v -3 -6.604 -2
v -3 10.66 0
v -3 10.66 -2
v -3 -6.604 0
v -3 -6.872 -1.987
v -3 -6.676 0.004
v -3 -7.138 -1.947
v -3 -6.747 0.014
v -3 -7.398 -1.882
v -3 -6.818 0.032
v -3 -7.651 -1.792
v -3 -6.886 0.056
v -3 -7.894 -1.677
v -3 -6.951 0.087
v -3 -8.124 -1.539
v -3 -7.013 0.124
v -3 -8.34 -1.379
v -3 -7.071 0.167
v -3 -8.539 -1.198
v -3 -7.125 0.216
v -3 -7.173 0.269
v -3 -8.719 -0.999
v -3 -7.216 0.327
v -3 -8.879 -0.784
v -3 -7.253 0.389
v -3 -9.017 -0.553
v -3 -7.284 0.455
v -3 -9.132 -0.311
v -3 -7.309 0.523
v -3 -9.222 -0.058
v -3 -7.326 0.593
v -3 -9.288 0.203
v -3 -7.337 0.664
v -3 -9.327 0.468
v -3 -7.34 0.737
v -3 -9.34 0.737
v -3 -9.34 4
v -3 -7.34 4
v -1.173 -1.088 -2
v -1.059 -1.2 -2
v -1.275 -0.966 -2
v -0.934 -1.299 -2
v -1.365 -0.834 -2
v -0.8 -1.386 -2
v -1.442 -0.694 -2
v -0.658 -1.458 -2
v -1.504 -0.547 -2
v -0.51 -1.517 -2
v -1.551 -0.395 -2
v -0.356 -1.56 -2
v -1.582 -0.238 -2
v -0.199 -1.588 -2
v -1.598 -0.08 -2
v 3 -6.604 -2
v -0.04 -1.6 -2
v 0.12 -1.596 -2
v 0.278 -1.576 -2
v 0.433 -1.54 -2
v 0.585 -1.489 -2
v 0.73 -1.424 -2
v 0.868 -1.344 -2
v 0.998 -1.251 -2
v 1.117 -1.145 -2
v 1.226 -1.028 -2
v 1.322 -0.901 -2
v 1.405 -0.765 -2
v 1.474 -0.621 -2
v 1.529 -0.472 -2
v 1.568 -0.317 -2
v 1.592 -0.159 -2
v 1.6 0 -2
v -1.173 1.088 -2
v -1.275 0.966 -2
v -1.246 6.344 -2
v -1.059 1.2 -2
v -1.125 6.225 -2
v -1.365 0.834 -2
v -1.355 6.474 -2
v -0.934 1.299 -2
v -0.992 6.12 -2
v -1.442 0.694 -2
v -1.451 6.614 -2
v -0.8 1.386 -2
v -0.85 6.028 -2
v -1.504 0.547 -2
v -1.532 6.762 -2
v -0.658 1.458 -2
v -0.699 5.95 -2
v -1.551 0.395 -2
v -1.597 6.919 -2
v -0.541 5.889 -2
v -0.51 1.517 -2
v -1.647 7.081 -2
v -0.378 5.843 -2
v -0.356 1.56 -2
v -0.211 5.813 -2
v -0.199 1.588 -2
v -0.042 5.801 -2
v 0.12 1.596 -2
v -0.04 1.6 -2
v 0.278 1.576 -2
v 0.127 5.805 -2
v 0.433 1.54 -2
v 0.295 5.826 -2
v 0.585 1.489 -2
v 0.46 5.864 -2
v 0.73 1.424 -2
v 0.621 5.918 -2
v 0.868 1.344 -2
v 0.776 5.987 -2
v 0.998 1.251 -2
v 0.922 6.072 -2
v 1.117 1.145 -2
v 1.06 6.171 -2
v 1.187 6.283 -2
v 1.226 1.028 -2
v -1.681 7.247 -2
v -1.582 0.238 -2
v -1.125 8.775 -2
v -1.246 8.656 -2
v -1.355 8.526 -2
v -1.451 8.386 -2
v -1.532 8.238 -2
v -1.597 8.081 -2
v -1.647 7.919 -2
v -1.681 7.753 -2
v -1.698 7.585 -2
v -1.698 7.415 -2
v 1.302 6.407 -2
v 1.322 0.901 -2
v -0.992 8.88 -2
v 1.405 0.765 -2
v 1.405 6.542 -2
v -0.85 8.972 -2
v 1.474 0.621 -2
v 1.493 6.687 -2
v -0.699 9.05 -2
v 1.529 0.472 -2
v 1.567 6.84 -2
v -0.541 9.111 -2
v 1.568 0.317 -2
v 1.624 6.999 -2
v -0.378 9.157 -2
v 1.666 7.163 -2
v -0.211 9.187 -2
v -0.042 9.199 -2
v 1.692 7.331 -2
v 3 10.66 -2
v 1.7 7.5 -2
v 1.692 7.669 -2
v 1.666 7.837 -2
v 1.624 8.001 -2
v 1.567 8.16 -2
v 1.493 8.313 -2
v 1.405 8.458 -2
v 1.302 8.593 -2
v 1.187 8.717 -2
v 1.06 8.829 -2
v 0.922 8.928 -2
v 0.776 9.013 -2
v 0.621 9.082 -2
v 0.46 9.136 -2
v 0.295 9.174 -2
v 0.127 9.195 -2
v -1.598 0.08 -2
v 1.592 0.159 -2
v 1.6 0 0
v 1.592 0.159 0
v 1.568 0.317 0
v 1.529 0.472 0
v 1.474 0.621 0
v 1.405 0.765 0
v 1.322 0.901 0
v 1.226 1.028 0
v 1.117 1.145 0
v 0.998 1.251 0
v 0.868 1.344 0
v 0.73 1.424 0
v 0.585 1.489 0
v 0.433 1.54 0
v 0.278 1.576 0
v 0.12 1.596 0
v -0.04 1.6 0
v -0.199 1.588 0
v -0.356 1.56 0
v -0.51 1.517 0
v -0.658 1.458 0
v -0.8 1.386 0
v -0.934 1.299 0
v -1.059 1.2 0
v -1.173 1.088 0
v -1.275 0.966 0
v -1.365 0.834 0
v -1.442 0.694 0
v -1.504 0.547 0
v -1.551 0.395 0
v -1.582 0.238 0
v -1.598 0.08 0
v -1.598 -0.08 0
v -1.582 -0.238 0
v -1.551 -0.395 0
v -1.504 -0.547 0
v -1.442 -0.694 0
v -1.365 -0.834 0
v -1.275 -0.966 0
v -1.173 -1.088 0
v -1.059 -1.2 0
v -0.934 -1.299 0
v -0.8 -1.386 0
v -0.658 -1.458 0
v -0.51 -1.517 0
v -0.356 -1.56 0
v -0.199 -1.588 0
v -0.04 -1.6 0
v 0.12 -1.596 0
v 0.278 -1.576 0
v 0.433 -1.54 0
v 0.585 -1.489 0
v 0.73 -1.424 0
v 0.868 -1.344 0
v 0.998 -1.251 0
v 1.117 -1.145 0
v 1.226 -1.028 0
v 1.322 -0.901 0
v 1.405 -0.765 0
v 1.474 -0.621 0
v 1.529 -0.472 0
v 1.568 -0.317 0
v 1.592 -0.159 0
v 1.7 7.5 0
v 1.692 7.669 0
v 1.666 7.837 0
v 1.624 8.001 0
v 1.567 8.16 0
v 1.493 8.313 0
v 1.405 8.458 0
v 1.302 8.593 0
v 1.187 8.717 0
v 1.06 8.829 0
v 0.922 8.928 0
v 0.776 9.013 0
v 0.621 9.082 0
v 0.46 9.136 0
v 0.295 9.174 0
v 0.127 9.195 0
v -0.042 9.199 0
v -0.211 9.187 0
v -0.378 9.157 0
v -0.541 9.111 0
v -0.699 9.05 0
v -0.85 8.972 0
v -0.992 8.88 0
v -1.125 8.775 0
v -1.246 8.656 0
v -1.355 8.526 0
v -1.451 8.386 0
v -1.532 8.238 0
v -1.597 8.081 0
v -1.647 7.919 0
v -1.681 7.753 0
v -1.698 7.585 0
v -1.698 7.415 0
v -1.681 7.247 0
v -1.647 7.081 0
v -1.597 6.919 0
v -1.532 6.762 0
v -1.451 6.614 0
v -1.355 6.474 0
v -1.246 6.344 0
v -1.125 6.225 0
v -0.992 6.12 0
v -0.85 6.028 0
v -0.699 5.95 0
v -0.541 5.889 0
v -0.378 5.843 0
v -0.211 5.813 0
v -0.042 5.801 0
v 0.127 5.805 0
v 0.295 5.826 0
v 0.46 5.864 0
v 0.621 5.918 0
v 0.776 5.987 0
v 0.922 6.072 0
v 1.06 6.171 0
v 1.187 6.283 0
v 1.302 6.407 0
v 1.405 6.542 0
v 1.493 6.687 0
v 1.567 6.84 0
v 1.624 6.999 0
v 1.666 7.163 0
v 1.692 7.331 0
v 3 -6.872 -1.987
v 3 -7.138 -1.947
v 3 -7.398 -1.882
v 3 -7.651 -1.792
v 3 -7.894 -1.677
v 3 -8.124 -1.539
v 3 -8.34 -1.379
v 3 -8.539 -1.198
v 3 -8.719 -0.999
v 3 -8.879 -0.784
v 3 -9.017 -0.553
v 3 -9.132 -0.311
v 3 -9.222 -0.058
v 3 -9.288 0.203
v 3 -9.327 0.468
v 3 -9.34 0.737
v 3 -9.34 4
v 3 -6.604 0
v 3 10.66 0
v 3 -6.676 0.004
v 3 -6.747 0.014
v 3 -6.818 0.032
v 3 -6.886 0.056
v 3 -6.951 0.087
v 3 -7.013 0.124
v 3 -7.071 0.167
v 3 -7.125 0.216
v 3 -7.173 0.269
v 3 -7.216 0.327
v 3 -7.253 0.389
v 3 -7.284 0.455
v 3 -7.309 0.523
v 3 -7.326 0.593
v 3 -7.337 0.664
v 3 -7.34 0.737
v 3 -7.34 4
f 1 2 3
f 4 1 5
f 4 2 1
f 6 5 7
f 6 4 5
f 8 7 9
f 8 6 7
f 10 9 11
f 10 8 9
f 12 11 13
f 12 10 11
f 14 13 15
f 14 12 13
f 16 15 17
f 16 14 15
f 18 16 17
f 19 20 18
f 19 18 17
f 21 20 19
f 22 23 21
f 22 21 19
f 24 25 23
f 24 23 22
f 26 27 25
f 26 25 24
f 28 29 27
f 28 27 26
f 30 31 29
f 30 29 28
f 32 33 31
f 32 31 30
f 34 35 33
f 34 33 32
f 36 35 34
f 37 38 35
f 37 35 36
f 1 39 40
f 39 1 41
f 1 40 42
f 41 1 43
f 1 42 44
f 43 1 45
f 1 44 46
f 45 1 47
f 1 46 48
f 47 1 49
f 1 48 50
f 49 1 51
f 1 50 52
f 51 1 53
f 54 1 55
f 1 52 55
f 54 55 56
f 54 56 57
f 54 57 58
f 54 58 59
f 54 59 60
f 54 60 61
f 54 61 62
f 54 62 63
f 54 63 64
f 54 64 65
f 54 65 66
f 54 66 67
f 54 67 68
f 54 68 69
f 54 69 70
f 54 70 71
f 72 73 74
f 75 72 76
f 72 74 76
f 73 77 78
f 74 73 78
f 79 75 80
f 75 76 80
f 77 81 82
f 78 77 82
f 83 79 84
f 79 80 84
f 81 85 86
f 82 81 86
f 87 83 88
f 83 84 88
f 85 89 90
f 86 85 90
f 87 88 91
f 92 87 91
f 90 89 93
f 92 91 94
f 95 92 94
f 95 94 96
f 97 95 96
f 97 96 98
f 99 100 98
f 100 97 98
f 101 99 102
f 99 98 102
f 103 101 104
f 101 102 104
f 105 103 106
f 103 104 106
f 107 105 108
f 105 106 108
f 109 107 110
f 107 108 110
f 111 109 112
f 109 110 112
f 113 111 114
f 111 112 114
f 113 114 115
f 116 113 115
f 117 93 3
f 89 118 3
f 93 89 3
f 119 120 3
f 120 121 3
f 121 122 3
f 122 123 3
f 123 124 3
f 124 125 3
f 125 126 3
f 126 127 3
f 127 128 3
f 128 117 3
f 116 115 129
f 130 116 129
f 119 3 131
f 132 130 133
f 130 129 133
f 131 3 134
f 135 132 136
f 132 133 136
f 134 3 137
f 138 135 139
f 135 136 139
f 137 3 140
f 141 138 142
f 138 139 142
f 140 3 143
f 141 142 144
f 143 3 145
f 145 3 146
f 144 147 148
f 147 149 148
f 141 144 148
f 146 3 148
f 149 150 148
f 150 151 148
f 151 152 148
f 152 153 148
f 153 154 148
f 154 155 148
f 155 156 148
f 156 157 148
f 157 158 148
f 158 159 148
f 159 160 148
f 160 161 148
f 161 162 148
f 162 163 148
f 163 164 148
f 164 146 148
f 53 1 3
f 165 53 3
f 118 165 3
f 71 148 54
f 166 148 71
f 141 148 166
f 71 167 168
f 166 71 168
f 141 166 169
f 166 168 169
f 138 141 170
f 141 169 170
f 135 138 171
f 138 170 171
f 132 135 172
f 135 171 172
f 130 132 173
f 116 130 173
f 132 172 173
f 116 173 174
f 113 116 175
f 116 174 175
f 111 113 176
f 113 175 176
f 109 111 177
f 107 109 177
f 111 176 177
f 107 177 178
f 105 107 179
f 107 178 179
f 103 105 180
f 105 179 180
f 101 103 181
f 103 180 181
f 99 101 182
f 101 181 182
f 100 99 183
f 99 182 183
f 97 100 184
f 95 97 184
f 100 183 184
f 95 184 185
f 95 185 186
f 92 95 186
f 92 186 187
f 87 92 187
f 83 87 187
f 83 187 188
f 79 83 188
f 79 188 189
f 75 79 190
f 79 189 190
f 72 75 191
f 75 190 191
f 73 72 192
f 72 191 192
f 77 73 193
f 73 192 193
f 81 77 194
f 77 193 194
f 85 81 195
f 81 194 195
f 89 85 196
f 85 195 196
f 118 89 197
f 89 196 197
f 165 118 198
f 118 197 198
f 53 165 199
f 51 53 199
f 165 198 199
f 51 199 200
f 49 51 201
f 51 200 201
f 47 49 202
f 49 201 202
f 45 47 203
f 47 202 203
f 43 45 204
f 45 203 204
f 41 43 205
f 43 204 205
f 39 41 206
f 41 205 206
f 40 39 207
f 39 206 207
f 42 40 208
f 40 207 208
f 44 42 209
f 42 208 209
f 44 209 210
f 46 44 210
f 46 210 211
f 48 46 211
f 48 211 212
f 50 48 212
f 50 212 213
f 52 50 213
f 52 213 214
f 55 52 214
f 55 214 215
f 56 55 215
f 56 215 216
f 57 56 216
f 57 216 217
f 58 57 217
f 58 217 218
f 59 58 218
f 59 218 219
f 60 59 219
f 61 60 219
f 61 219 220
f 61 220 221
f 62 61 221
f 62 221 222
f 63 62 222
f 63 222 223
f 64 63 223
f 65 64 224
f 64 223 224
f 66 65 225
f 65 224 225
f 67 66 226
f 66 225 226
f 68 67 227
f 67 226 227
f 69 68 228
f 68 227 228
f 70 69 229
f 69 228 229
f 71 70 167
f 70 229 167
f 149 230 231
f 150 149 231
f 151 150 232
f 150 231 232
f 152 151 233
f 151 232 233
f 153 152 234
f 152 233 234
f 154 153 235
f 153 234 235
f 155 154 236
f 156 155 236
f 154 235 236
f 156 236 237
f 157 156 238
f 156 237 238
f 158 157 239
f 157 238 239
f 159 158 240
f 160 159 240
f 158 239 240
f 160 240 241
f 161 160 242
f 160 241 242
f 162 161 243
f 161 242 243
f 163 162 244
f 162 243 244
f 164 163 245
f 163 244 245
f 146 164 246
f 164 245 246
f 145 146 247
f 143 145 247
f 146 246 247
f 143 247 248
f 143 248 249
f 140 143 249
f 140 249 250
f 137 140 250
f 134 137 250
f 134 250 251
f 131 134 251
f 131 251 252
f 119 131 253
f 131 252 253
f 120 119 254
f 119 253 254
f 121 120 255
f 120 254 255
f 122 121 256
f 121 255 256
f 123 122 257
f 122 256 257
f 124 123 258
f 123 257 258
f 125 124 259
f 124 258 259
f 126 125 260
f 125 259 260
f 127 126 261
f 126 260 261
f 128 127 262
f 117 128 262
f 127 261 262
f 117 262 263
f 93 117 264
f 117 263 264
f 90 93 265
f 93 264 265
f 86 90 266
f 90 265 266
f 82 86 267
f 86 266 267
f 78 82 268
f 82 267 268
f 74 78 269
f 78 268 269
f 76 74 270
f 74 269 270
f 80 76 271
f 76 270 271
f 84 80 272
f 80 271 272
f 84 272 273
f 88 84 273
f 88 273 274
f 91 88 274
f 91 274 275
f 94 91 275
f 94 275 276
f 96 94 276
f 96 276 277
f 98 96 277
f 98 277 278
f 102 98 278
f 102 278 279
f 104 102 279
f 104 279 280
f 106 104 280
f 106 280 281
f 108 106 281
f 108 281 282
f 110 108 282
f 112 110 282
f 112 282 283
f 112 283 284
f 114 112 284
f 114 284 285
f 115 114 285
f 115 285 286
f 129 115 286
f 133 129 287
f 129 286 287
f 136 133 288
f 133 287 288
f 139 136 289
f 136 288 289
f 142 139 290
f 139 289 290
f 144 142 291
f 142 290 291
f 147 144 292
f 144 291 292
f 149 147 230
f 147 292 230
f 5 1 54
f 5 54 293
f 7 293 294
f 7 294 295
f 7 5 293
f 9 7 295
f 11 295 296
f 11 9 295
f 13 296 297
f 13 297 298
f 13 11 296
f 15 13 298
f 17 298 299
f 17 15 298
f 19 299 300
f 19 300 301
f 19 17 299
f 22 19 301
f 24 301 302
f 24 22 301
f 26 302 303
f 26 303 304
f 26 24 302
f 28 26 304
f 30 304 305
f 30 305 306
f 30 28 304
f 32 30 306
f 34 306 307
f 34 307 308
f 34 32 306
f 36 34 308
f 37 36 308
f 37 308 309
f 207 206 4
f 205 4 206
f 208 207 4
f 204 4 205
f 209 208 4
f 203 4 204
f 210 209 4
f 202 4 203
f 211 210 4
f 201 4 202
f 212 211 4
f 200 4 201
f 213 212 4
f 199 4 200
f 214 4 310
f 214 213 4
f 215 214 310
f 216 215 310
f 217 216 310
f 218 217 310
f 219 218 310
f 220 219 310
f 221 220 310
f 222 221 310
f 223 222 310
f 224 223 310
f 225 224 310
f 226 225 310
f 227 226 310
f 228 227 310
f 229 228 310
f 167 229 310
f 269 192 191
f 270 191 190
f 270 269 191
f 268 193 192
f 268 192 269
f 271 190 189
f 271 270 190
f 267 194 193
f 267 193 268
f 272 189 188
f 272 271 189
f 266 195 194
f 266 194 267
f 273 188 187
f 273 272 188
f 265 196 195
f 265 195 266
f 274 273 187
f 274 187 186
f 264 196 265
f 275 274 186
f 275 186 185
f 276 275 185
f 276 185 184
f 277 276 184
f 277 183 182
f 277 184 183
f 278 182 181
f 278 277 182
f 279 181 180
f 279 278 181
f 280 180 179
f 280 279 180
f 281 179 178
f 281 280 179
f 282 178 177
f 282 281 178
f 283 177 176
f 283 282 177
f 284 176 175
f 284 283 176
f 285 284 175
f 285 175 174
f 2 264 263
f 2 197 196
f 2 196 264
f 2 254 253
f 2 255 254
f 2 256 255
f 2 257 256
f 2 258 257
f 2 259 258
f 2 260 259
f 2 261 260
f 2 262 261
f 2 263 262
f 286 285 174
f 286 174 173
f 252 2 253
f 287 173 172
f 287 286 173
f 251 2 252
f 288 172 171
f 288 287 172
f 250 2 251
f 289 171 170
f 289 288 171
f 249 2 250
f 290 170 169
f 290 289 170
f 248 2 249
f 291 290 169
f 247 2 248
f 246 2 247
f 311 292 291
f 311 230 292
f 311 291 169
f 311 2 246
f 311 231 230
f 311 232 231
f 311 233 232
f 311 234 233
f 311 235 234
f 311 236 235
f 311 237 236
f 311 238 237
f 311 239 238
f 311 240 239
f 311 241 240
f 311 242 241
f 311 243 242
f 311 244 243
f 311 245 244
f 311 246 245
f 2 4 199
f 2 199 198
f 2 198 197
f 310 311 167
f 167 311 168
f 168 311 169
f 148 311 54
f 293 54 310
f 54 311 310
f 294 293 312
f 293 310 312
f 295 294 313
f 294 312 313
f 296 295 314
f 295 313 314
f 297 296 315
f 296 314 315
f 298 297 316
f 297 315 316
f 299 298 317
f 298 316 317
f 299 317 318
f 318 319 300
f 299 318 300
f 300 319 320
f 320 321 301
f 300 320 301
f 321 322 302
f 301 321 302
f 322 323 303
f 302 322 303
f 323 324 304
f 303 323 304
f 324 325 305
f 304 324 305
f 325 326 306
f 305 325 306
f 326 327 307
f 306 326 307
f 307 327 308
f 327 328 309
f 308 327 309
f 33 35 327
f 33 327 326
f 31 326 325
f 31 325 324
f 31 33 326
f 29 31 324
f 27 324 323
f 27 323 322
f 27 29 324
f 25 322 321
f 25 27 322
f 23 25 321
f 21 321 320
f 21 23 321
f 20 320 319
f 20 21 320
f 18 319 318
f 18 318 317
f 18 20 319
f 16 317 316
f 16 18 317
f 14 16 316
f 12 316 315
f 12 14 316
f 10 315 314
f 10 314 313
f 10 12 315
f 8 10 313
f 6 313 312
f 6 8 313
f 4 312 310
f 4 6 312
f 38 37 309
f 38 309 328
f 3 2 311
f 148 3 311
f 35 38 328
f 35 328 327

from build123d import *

# Parameters (mm, degrees)
SKETCH_1_W                       = 6
SKETCH_1_H                       = 18
SKETCH_1_R                       = 1.6
SKETCH_1_R_2                     = 1.7
SM_BASE_FLANGE_1_DEPTH           = 2
SM_EDGE_FLANGE_1_STRIP_W         = 9.4732
SM_EDGE_FLANGE_1_STRIP_H         = 2
SM_EDGE_FLANGE_1_STRIP_CUT_DEPTH = 6
SM_EDGE_FLANGE_1_DEPTH           = 6


# Sheet-metal steps are written as plain solids
with BuildPart() as part:
    # Sketch 1 → Базовая кромка1 (new body)
    with BuildSketch(Plane.XY):
        with Locations((0, 1.659676661)):
            Rectangle(SKETCH_1_W, SKETCH_1_H)
        Circle(SKETCH_1_R, mode=Mode.SUBTRACT)
        with Locations((0, 7.5)):
            Circle(SKETCH_1_R_2, mode=Mode.SUBTRACT)
    extrude(amount=-SM_BASE_FLANGE_1_DEPTH)

    # Ребро-кромка1 strip (across the edge) → Ребро-кромка1 strip cut (cut)
    with BuildSketch(Plane(origin=(-3, -7.340323339, 0), x_dir=(0, 1, 0), z_dir=(1, 0, 0))):
        with Locations((-4, -1)):
            Rectangle(SM_EDGE_FLANGE_1_STRIP_W, SM_EDGE_FLANGE_1_STRIP_H)
    extrude(amount=SM_EDGE_FLANGE_1_STRIP_CUT_DEPTH, mode=Mode.SUBTRACT)

    # Ребро-кромка1 section (across the edge) → Ребро-кромка1 (add)
    with BuildSketch(Plane(origin=(-3, -7.340323339, 0), x_dir=(0, 1, 0), z_dir=(1, 0, 0))):
        with BuildLine():
            Line((-2, 0.7366), (-2, 4))
            Line((-2, 4), (0, 4))
            Line((0, 4), (0, 0.7366))
            ThreePointArc((0, 0.7366), (0.215745145, 0.215745145), (0.7366, 0))
            Line((0.7366, 0), (0.7366, -2))
            ThreePointArc((0.7366, -2), (-1.198468417, -1.198468417), (-2, 0.7366))
        make_face()
    extrude(amount=SM_EDGE_FLANGE_1_DEPTH)


solid = part.part
